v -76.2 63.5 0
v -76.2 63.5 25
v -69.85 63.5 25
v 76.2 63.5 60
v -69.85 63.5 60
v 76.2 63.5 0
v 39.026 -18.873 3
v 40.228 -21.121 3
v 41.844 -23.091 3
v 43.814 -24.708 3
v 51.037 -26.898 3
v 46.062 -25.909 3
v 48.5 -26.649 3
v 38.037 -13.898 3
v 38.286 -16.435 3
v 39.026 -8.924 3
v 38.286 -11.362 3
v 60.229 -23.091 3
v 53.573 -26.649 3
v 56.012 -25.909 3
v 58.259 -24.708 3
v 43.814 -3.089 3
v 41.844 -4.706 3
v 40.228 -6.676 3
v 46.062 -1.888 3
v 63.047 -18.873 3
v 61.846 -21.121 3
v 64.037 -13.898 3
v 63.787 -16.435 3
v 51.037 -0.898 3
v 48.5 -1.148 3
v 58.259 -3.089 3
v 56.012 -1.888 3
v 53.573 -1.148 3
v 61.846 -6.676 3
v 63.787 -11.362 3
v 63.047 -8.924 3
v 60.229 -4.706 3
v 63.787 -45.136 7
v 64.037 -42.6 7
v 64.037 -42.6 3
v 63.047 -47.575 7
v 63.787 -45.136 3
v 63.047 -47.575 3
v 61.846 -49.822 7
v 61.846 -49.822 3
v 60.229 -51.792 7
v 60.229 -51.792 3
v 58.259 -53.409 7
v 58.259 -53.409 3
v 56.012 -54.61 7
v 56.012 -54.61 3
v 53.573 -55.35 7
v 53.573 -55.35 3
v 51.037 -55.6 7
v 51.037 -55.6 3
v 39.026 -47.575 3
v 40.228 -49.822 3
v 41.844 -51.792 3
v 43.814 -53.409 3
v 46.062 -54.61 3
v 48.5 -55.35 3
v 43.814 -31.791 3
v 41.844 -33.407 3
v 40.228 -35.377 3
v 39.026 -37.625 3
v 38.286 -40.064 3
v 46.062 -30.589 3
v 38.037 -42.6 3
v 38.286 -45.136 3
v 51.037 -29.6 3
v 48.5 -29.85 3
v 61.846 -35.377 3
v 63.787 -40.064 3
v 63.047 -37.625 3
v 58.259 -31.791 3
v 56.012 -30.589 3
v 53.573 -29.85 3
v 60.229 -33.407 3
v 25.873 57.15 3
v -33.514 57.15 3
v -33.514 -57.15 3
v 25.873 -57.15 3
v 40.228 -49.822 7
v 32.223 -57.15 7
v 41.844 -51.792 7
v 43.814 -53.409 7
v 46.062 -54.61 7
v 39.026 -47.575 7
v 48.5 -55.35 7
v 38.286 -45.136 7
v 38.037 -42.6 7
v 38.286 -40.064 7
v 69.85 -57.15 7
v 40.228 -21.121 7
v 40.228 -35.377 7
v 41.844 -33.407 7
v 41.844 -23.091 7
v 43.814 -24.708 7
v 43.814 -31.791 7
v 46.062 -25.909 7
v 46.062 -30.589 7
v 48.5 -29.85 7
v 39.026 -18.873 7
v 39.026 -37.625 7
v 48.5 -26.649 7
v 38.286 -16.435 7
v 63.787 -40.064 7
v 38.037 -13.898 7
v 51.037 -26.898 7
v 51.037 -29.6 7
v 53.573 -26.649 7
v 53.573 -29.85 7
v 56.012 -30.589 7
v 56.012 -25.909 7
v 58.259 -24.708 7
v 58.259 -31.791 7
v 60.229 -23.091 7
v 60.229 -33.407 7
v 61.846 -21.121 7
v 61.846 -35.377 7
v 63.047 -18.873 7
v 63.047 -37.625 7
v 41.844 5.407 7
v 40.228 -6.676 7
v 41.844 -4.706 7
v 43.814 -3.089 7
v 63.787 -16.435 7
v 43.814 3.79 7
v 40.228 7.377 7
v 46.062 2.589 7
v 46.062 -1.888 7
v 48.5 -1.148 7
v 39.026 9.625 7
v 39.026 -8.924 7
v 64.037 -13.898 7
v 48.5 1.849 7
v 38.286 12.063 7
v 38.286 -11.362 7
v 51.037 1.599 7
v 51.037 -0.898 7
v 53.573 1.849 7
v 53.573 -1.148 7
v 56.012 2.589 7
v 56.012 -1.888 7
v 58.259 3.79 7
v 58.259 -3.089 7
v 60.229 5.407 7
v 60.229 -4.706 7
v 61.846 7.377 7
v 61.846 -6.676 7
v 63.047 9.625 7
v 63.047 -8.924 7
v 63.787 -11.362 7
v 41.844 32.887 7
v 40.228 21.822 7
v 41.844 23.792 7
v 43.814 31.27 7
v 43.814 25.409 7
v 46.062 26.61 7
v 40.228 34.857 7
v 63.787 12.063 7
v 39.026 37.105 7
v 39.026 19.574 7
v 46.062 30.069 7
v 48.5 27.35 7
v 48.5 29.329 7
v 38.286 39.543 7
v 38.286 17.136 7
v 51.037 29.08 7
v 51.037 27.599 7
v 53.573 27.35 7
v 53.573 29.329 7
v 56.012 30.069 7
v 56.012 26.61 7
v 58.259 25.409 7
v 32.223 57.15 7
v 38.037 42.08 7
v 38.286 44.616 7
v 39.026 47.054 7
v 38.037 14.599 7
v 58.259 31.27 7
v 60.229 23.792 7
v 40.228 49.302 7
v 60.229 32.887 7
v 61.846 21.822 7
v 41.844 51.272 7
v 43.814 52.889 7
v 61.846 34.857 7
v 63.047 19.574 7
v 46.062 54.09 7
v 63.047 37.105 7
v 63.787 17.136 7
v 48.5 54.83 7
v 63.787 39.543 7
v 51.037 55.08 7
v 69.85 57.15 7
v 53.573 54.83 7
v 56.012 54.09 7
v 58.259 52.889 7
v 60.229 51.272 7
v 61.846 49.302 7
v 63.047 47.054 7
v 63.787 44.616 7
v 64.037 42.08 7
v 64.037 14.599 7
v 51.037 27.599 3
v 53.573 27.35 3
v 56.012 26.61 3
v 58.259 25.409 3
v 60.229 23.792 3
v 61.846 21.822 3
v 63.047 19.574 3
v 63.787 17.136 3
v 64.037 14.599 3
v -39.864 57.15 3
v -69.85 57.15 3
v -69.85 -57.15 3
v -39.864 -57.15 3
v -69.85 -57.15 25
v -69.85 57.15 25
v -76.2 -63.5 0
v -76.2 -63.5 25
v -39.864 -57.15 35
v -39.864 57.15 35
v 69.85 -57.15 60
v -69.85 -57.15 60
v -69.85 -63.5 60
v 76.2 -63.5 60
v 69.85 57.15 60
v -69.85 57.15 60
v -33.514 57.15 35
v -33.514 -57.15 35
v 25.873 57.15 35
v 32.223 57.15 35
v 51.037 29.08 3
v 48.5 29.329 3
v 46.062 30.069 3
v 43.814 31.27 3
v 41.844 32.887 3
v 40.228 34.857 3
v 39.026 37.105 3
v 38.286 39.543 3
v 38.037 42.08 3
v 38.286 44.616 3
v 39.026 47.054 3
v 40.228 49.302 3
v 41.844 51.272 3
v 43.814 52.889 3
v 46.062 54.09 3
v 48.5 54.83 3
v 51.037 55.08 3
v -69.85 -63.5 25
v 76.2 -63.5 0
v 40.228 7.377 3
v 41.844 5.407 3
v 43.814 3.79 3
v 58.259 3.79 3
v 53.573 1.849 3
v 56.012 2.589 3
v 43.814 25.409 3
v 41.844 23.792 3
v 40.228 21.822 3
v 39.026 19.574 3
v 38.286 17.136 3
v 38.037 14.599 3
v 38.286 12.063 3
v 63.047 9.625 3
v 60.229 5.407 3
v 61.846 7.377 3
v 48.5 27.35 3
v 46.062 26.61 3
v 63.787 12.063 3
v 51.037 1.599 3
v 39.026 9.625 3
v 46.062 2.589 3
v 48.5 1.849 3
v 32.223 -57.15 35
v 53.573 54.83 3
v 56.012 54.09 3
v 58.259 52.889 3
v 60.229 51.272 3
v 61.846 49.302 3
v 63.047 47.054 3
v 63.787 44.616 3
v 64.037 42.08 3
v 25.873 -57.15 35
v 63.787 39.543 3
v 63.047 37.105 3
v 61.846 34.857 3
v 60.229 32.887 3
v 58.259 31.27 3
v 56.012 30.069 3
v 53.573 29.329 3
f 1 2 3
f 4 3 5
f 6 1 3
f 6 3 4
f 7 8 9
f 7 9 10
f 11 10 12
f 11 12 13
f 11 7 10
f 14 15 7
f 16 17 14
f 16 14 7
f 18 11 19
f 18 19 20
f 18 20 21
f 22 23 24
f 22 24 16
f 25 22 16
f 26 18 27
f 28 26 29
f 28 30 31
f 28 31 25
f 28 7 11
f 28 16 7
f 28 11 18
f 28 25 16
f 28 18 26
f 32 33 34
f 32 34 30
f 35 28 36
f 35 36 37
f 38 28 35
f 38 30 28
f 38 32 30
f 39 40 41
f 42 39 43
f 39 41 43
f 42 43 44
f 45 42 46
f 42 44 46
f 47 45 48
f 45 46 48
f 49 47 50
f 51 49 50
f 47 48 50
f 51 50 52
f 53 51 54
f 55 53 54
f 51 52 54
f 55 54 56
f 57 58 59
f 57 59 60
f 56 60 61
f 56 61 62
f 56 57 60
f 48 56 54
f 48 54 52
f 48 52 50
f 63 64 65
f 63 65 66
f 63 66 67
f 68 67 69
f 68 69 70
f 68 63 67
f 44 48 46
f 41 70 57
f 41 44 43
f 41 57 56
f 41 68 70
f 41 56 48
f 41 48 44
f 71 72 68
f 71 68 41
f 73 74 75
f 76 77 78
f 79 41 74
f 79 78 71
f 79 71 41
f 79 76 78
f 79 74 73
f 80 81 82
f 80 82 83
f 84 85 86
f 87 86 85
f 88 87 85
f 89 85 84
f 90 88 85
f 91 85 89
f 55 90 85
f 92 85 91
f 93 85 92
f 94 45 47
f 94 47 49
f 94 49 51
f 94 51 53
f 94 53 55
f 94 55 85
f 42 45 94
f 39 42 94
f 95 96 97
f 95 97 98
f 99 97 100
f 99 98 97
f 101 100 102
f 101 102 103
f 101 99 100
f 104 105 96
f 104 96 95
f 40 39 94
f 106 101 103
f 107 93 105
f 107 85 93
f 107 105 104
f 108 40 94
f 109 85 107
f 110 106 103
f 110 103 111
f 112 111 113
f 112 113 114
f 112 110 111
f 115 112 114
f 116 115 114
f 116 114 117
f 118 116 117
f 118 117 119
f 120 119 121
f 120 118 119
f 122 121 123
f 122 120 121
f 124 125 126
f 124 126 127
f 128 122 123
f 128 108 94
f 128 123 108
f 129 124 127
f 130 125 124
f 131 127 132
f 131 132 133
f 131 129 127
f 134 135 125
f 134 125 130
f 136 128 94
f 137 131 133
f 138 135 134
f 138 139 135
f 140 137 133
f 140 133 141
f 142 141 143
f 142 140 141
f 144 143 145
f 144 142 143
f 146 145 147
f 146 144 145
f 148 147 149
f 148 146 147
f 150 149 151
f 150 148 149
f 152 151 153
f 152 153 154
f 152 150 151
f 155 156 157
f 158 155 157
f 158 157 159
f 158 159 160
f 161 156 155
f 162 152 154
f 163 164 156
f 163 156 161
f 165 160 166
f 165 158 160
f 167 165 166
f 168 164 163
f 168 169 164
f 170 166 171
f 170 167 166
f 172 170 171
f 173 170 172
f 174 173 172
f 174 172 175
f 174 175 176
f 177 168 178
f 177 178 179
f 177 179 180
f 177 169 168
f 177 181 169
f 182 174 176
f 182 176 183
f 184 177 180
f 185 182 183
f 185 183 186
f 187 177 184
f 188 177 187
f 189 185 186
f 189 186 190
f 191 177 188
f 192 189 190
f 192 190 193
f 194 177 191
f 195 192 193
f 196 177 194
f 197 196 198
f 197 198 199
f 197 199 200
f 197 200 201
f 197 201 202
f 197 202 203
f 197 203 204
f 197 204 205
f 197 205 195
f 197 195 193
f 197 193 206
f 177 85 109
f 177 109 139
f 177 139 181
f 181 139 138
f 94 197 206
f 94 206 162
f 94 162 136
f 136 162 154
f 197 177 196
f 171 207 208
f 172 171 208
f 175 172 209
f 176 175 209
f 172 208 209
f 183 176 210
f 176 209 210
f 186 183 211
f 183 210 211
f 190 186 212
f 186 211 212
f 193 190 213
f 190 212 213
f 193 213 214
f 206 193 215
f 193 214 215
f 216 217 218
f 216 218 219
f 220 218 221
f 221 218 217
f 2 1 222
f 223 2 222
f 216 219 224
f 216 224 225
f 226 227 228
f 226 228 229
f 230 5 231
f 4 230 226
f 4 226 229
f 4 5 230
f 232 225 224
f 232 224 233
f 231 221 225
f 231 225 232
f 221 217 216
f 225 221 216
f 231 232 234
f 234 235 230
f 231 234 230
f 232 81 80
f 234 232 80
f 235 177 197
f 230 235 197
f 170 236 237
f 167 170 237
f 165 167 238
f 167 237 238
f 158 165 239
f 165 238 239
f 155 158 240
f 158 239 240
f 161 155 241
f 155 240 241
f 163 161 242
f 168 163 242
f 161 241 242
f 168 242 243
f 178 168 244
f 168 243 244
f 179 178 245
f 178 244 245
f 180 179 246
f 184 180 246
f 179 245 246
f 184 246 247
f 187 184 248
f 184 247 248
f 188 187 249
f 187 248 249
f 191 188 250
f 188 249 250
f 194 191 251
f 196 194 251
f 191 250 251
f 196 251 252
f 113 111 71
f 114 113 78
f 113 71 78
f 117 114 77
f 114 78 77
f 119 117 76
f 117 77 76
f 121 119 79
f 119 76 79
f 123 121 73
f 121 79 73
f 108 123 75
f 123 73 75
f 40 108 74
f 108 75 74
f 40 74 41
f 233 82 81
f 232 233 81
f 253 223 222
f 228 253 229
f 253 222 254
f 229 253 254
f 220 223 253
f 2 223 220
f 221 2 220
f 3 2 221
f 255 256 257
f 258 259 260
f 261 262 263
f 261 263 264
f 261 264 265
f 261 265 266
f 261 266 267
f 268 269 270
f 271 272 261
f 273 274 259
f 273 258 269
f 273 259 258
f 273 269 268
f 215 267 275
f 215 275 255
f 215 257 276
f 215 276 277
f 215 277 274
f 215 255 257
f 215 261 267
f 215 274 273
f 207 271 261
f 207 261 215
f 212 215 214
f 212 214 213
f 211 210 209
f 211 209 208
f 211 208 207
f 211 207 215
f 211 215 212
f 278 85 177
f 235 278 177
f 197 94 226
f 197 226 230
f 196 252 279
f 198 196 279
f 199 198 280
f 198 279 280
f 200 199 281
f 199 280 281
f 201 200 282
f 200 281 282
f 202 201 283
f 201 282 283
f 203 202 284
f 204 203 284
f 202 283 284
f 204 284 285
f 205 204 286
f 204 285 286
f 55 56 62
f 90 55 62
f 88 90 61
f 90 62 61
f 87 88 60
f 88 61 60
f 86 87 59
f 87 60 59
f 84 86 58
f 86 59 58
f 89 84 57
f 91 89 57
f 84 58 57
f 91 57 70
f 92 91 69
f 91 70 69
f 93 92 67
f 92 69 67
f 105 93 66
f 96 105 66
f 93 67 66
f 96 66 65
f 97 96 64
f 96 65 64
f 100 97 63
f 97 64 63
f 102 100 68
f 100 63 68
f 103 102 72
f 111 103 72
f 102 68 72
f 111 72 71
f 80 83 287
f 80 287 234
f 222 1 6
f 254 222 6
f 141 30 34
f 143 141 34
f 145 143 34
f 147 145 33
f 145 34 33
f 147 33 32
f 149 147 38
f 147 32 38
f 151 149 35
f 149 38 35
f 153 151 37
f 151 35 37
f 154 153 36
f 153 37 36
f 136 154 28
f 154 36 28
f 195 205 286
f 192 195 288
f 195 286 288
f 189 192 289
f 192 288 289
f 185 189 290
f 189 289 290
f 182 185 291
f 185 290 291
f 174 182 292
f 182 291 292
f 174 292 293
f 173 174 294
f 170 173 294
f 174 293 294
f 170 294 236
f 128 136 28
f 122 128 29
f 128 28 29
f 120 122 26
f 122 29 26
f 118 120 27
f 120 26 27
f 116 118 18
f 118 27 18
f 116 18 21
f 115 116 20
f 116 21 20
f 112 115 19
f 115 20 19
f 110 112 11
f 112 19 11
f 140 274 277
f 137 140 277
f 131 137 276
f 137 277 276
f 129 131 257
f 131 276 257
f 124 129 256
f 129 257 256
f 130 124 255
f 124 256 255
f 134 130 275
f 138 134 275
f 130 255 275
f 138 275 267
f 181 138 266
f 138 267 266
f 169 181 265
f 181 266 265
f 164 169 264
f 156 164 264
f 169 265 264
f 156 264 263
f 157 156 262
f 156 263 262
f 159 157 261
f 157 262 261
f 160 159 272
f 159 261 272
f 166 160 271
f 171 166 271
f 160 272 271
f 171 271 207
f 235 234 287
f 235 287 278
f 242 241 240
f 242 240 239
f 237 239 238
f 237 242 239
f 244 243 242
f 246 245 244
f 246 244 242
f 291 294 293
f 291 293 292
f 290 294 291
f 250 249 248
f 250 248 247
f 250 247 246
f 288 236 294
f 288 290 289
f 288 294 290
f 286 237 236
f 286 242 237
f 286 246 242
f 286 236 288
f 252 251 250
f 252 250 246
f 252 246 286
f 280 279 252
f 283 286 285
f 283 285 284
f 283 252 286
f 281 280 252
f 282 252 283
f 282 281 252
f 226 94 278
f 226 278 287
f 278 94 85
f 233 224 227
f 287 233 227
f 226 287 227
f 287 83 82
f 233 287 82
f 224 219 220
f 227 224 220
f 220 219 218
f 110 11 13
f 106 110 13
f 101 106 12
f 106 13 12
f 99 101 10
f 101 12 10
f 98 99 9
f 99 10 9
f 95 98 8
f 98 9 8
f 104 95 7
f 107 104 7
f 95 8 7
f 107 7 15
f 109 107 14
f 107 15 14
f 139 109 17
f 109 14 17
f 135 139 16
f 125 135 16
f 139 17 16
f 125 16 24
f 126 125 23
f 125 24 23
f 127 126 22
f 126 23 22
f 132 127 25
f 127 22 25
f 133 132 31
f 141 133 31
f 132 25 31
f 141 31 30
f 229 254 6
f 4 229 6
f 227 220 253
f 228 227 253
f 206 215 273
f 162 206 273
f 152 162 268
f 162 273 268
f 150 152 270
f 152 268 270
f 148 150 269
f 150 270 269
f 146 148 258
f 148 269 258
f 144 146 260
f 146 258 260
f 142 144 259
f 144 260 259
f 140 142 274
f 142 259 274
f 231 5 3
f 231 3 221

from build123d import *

# Parameters (mm, degrees)
F0_W     = 6.3500022411
F0_H     = 6.3500011563
F0_H_2   = 114.2999988437
F0_H_3   = 6.35
F1_DEPTH = 25
F0_W_2   = 6.35
F2_DEPTH = 60
F0_W_3   = 6.3499994576
F3_DEPTH = 35
F4_DEPTH = 7
F0_W_4   = 29.9864560366
F0_W_5   = 59.3868153334
F5_DEPTH = 3


with BuildPart() as f1:
    # F0 (on Top) → F1 (new body)
    with BuildSketch(Plane.XY):
        with Locations((-73.0249988794, -60.3249994218)):
            Rectangle(F0_W, F0_H)
        with Locations((-73.0249988794, 5.782e-07)):
            Rectangle(F0_W, F0_H_2)
        with Locations((-73.0249988794, 60.325)):
            Rectangle(F0_W, F0_H_3)
    extrude(amount=F1_DEPTH)

    # F0 (on Top) → F2 (join)
    with BuildSketch(Plane.XY):
        Polygon((-39.8635417223, -57.1499988437), (-69.8499977589, -57.1499988437), (-69.8499977589, -63.5), (69.85, -63.5), (69.85, -57.1499988437), (51.0366365343, -57.1499988437), (32.2232730687, -57.1499988437), (25.8732736111, -57.1499988437), (-33.5135417223, -57.1499988437), align=None)
        Polygon((69.85, 63.5), (-69.8499977589, 63.5), (-69.8499977589, 57.15), (-39.8635417223, 57.15), (-33.5135417223, 57.15), (25.8732736111, 57.15), (32.2232730687, 57.15), (51.0366365343, 57.15), (69.85, 57.15), align=None)
        with Locations((73.025, 5.782e-07)):
            Rectangle(F0_W_2, F0_H_2)
        with Locations((73.025, -60.3249994218)):
            Rectangle(F0_W_2, F0_H)
        with Locations((73.025, 60.325)):
            Rectangle(F0_W_2, F0_H_3)
    extrude(amount=F2_DEPTH)

    # F0 (on Top) → F3 (join)
    with BuildSketch(Plane.XY):
        with Locations((-36.6885417223, 5.782e-07)):
            Rectangle(F0_W_2, F0_H_2)
        with Locations((29.0482733399, 5.782e-07)):
            Rectangle(F0_W_3, F0_H_2)
    extrude(amount=F3_DEPTH)

    # F0 (on Top) → F4 (join)
    with BuildSketch(Plane.XY):
        with BuildLine():
            Line((51.0366365343, 55.0795492828), (51.0366365343, 57.15))
            Line((51.0366365343, 57.15), (32.2232730687, 57.15))
            Line((32.2232730687, 57.15), (32.2232730687, -57.1499988437))
            Line((32.2232730687, -57.1499988437), (51.0366365343, -57.1499988437))
            Line((51.0366365343, -57.1499988437), (51.0366365343, -55.5998345017))
            ThreePointArc((51.0366365343, -55.5998345017), (38.0366365343, -42.5998345017), (51.0366365343, -29.5998345017))
            Line((51.0366365343, -29.5998345017), (51.0366365343, -26.8984061778))
            ThreePointArc((51.0366365343, -26.8984061778), (38.0366365343, -13.8984061778), (51.0366365343, -0.8984061778))
            Line((51.0366365343, -0.8984061778), (51.0366365343, 1.5994620398))
            ThreePointArc((51.0366365343, 1.5994620398), (38.0366365343, 14.5994620398), (51.0366365343, 27.5994620398))
            Line((51.0366365343, 27.5994620398), (51.0366365343, 29.0795492828))
            ThreePointArc((51.0366365343, 29.0795492828), (38.0366365343, 42.0795492828), (51.0366365343, 55.0795492828))
        make_face()
        with BuildLine():
            Line((69.85, -57.1499988437), (69.85, 57.15))
            Line((69.85, 57.15), (51.0366365343, 57.15))
            Line((51.0366365343, 57.15), (51.0366365343, 55.0795492828))
            ThreePointArc((51.0366365343, 55.0795492828), (60.2290246898, 51.2719374382), (64.0366365343, 42.0795492828))
            ThreePointArc((64.0366365343, 42.0795492828), (60.2290246898, 32.8871611274), (51.0366365343, 29.0795492828))
            Line((51.0366365343, 29.0795492828), (51.0366365343, 27.5994620398))
            ThreePointArc((51.0366365343, 27.5994620398), (60.2290246898, 23.7918501952), (64.0366365343, 14.5994620398))
            ThreePointArc((64.0366365343, 14.5994620398), (60.2290246898, 5.4070738843), (51.0366365343, 1.5994620398))
            Line((51.0366365343, 1.5994620398), (51.0366365343, -0.8984061778))
            ThreePointArc((51.0366365343, -0.8984061778), (60.2290246898, -4.7060180223), (64.0366365343, -13.8984061778))
            ThreePointArc((64.0366365343, -13.8984061778), (60.2290246898, -23.0907943332), (51.0366365343, -26.8984061778))
            Line((51.0366365343, -26.8984061778), (51.0366365343, -29.5998345017))
            ThreePointArc((51.0366365343, -29.5998345017), (60.2290246898, -33.4074463463), (64.0366365343, -42.5998345017))
            ThreePointArc((64.0366365343, -42.5998345017), (60.2290246898, -51.7922226572), (51.0366365343, -55.5998345017))
            Line((51.0366365343, -55.5998345017), (51.0366365343, -57.1499988437))
            Line((51.0366365343, -57.1499988437), (69.85, -57.1499988437))
        make_face()
    extrude(amount=F4_DEPTH)

    # F0 (on Top) → F5 (join)
    with BuildSketch(Plane.XY):
        with Locations((-54.8567697406, 5.782e-07)):
            Rectangle(F0_W_4, F0_H_2)
        with Locations((-3.8201340556, 5.782e-07)):
            Rectangle(F0_W_5, F0_H_2)
        with BuildLine():
            ThreePointArc((51.0366365343, -29.5998345017), (38.0366365343, -42.5998345017), (51.0366365343, -55.5998345017))
            Line((51.0366365343, -55.5998345017), (51.0366365343, -29.5998345017))
        make_face()
        with BuildLine():
            Line((51.0366365343, -29.5998345017), (51.0366365343, -55.5998345017))
            ThreePointArc((51.0366365343, -55.5998345017), (60.2290246898, -51.7922226572), (64.0366365343, -42.5998345017))
            ThreePointArc((64.0366365343, -42.5998345017), (60.2290246898, -33.4074463463), (51.0366365343, -29.5998345017))
        make_face()
        with BuildLine():
            Line((51.0366365343, -0.8984061778), (51.0366365343, -26.8984061778))
            ThreePointArc((51.0366365343, -26.8984061778), (60.2290246898, -23.0907943332), (64.0366365343, -13.8984061778))
            ThreePointArc((64.0366365343, -13.8984061778), (60.2290246898, -4.7060180223), (51.0366365343, -0.8984061778))
        make_face()
        with BuildLine():
            ThreePointArc((51.0366365343, -0.8984061778), (38.0366365343, -13.8984061778), (51.0366365343, -26.8984061778))
            Line((51.0366365343, -26.8984061778), (51.0366365343, -0.8984061778))
        make_face()
        with BuildLine():
            Line((51.0366365343, 1.5994620398), (51.0366365343, 27.5994620398))
            ThreePointArc((51.0366365343, 27.5994620398), (38.0366365343, 14.5994620398), (51.0366365343, 1.5994620398))
        make_face()
        with BuildLine():
            ThreePointArc((64.0366365343, 14.5994620398), (60.2290246898, 23.7918501952), (51.0366365343, 27.5994620398))
            Line((51.0366365343, 27.5994620398), (51.0366365343, 1.5994620398))
            ThreePointArc((51.0366365343, 1.5994620398), (60.2290246898, 5.4070738843), (64.0366365343, 14.5994620398))
        make_face()
        with BuildLine():
            ThreePointArc((64.0366365343, 42.0795492828), (60.2290246898, 51.2719374382), (51.0366365343, 55.0795492828))
            Line((51.0366365343, 55.0795492828), (51.0366365343, 29.0795492828))
            ThreePointArc((51.0366365343, 29.0795492828), (60.2290246898, 32.8871611274), (64.0366365343, 42.0795492828))
        make_face()
        with BuildLine():
            Line((51.0366365343, 29.0795492828), (51.0366365343, 55.0795492828))
            ThreePointArc((51.0366365343, 55.0795492828), (38.0366365343, 42.0795492828), (51.0366365343, 29.0795492828))
        make_face()
    extrude(amount=F5_DEPTH)


solid = f1.part
